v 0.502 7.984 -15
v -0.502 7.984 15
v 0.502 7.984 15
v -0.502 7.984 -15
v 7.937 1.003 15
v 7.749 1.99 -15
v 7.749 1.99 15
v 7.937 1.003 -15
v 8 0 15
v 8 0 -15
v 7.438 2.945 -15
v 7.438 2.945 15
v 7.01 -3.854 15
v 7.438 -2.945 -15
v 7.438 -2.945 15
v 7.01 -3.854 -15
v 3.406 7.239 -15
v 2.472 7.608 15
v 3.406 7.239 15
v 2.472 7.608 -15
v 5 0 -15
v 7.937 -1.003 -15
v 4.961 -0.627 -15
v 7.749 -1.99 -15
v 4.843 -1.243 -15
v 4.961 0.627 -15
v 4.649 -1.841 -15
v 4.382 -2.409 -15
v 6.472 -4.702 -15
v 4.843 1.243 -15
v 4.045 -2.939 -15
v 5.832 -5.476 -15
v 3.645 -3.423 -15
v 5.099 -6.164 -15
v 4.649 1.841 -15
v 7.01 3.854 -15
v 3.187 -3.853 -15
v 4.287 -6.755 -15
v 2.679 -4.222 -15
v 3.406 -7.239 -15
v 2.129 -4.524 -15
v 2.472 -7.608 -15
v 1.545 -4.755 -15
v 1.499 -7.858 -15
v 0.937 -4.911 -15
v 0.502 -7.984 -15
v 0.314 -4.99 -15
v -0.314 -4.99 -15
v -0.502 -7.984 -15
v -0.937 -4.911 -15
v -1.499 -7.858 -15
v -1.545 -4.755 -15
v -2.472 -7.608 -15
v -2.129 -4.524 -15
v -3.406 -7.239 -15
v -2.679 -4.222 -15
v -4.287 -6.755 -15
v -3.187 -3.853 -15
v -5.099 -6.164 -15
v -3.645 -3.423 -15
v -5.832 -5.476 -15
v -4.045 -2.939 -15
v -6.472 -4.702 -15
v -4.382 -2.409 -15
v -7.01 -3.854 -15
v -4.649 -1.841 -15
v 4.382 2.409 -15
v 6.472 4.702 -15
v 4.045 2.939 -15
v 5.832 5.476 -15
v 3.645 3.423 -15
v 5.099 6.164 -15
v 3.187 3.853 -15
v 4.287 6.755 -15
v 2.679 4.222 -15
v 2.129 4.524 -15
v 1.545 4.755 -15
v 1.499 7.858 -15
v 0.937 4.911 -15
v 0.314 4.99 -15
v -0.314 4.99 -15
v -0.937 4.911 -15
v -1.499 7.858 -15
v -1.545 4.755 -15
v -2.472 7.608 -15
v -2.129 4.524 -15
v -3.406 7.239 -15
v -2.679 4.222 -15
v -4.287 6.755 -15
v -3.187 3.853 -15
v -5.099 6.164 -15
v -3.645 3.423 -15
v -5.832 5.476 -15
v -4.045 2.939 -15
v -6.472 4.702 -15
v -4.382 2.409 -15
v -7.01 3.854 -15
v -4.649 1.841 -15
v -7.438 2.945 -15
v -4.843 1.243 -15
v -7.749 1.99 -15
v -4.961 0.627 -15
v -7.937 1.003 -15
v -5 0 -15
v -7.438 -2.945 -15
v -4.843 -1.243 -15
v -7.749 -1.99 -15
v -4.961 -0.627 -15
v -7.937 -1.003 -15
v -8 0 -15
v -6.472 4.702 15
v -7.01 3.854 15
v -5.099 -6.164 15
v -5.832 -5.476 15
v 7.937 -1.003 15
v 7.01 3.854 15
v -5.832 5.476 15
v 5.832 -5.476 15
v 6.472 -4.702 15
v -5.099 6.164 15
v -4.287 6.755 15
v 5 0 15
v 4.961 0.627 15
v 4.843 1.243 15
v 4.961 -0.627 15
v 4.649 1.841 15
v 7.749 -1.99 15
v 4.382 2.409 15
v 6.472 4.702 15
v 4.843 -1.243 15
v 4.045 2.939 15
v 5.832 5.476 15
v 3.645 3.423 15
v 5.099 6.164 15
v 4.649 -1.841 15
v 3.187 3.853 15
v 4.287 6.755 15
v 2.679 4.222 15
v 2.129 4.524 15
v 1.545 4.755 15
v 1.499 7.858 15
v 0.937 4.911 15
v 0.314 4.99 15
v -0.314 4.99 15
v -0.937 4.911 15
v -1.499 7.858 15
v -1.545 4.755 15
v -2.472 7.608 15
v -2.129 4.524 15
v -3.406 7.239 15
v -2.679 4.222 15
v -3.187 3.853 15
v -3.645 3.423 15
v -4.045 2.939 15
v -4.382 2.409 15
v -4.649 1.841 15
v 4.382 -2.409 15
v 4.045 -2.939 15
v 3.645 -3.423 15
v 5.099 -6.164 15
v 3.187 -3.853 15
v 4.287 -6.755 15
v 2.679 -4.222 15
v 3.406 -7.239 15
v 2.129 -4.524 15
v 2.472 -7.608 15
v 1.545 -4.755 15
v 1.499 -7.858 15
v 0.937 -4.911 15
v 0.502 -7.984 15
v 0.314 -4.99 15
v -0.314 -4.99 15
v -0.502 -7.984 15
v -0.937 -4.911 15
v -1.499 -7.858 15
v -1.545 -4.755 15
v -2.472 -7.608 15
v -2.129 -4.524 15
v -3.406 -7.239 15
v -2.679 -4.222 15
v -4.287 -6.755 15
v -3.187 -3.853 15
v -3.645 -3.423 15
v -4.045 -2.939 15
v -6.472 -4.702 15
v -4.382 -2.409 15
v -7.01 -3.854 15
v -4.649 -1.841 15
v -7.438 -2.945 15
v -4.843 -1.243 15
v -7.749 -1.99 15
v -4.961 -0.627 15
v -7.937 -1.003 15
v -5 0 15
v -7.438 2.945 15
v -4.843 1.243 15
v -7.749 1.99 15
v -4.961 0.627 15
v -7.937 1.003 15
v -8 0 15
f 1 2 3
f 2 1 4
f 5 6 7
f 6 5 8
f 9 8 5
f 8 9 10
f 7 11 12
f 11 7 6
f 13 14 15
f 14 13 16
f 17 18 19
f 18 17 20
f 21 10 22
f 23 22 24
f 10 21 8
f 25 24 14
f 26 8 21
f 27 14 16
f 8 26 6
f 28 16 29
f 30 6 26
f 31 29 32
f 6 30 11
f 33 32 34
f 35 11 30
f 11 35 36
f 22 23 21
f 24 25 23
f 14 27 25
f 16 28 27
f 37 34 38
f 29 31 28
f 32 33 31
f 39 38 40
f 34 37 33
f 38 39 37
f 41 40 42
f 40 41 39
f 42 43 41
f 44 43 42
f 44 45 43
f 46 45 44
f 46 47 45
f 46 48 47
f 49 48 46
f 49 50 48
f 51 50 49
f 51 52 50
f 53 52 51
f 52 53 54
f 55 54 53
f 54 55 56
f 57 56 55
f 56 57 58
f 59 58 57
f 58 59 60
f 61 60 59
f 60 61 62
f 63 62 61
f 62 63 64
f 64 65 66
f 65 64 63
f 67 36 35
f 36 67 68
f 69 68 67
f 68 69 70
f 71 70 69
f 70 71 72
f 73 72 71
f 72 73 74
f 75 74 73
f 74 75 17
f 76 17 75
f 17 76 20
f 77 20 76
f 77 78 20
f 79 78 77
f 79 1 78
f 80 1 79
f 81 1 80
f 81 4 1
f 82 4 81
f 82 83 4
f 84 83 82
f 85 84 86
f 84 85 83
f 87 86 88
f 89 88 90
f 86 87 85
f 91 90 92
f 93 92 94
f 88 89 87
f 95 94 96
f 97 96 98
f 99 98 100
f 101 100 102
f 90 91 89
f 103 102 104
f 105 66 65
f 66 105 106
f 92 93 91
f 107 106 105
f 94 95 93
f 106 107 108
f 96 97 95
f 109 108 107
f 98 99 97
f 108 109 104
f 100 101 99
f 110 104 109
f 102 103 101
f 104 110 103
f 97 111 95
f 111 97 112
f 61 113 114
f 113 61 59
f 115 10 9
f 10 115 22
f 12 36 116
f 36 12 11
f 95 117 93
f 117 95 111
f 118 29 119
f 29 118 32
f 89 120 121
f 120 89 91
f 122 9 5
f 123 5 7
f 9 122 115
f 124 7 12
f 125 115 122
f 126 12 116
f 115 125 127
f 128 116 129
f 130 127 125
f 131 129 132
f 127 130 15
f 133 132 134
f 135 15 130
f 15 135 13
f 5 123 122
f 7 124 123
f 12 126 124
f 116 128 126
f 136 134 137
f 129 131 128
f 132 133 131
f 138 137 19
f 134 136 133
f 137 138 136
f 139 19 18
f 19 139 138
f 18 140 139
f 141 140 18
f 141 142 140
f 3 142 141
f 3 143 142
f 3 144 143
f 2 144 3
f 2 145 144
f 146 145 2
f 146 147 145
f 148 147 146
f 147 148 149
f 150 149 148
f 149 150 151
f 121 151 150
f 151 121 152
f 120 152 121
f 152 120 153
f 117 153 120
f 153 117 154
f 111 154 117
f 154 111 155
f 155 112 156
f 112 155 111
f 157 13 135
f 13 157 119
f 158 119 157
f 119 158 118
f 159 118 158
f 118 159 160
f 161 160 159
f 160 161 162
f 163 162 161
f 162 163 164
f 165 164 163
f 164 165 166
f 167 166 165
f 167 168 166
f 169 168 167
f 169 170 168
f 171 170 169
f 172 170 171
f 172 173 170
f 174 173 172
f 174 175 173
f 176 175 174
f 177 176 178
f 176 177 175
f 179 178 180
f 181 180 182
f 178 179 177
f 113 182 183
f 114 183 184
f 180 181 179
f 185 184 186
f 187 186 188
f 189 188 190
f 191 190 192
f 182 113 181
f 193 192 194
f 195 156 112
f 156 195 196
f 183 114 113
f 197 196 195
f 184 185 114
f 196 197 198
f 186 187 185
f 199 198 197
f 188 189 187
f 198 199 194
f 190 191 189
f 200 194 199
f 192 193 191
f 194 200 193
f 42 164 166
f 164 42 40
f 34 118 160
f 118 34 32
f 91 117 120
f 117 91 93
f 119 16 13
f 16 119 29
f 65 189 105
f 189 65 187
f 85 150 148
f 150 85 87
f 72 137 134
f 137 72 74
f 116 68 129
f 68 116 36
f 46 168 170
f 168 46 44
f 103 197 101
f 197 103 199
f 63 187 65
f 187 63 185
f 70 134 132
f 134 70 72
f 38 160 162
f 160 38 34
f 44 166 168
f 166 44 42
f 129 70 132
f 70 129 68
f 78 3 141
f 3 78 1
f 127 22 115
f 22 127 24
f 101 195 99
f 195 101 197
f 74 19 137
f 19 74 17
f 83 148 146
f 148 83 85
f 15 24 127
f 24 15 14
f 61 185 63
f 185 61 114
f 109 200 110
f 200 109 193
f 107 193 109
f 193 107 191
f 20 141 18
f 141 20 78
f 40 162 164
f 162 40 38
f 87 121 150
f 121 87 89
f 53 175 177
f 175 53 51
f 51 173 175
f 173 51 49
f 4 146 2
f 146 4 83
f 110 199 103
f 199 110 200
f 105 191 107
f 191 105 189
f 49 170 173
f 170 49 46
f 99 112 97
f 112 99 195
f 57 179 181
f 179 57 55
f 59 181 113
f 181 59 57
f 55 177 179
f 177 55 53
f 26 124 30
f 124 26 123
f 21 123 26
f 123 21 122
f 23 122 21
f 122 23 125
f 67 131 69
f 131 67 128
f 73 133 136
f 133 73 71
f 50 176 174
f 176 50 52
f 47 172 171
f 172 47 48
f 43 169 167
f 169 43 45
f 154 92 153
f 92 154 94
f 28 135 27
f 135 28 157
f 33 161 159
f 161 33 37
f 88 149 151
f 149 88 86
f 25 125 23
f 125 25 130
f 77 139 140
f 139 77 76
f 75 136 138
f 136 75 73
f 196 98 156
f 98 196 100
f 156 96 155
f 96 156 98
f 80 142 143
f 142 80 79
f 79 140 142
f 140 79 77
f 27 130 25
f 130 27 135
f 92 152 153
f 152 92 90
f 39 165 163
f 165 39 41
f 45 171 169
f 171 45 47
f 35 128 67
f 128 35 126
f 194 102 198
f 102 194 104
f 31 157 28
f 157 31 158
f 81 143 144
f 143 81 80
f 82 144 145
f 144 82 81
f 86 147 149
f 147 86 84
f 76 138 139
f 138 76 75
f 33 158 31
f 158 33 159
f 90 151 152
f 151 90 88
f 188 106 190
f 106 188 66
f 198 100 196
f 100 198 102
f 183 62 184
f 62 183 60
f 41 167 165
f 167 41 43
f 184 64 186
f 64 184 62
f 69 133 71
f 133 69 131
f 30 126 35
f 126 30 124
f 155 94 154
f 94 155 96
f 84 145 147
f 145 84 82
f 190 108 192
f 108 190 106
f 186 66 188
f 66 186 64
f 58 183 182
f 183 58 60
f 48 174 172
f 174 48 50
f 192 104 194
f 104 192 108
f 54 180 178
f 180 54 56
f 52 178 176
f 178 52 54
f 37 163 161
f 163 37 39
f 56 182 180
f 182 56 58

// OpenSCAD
$fn = 50;


difference() {
	union() {
		translate(v = [0, 0, -15.0000000000]) {
			cylinder(h = 30, r = 8.0000000000);
		}
	}
	union() {
		translate(v = [0, 0, -100.0000000000]) {
			cylinder(h = 200, r = 5.0000000000);
		}
	}
}
